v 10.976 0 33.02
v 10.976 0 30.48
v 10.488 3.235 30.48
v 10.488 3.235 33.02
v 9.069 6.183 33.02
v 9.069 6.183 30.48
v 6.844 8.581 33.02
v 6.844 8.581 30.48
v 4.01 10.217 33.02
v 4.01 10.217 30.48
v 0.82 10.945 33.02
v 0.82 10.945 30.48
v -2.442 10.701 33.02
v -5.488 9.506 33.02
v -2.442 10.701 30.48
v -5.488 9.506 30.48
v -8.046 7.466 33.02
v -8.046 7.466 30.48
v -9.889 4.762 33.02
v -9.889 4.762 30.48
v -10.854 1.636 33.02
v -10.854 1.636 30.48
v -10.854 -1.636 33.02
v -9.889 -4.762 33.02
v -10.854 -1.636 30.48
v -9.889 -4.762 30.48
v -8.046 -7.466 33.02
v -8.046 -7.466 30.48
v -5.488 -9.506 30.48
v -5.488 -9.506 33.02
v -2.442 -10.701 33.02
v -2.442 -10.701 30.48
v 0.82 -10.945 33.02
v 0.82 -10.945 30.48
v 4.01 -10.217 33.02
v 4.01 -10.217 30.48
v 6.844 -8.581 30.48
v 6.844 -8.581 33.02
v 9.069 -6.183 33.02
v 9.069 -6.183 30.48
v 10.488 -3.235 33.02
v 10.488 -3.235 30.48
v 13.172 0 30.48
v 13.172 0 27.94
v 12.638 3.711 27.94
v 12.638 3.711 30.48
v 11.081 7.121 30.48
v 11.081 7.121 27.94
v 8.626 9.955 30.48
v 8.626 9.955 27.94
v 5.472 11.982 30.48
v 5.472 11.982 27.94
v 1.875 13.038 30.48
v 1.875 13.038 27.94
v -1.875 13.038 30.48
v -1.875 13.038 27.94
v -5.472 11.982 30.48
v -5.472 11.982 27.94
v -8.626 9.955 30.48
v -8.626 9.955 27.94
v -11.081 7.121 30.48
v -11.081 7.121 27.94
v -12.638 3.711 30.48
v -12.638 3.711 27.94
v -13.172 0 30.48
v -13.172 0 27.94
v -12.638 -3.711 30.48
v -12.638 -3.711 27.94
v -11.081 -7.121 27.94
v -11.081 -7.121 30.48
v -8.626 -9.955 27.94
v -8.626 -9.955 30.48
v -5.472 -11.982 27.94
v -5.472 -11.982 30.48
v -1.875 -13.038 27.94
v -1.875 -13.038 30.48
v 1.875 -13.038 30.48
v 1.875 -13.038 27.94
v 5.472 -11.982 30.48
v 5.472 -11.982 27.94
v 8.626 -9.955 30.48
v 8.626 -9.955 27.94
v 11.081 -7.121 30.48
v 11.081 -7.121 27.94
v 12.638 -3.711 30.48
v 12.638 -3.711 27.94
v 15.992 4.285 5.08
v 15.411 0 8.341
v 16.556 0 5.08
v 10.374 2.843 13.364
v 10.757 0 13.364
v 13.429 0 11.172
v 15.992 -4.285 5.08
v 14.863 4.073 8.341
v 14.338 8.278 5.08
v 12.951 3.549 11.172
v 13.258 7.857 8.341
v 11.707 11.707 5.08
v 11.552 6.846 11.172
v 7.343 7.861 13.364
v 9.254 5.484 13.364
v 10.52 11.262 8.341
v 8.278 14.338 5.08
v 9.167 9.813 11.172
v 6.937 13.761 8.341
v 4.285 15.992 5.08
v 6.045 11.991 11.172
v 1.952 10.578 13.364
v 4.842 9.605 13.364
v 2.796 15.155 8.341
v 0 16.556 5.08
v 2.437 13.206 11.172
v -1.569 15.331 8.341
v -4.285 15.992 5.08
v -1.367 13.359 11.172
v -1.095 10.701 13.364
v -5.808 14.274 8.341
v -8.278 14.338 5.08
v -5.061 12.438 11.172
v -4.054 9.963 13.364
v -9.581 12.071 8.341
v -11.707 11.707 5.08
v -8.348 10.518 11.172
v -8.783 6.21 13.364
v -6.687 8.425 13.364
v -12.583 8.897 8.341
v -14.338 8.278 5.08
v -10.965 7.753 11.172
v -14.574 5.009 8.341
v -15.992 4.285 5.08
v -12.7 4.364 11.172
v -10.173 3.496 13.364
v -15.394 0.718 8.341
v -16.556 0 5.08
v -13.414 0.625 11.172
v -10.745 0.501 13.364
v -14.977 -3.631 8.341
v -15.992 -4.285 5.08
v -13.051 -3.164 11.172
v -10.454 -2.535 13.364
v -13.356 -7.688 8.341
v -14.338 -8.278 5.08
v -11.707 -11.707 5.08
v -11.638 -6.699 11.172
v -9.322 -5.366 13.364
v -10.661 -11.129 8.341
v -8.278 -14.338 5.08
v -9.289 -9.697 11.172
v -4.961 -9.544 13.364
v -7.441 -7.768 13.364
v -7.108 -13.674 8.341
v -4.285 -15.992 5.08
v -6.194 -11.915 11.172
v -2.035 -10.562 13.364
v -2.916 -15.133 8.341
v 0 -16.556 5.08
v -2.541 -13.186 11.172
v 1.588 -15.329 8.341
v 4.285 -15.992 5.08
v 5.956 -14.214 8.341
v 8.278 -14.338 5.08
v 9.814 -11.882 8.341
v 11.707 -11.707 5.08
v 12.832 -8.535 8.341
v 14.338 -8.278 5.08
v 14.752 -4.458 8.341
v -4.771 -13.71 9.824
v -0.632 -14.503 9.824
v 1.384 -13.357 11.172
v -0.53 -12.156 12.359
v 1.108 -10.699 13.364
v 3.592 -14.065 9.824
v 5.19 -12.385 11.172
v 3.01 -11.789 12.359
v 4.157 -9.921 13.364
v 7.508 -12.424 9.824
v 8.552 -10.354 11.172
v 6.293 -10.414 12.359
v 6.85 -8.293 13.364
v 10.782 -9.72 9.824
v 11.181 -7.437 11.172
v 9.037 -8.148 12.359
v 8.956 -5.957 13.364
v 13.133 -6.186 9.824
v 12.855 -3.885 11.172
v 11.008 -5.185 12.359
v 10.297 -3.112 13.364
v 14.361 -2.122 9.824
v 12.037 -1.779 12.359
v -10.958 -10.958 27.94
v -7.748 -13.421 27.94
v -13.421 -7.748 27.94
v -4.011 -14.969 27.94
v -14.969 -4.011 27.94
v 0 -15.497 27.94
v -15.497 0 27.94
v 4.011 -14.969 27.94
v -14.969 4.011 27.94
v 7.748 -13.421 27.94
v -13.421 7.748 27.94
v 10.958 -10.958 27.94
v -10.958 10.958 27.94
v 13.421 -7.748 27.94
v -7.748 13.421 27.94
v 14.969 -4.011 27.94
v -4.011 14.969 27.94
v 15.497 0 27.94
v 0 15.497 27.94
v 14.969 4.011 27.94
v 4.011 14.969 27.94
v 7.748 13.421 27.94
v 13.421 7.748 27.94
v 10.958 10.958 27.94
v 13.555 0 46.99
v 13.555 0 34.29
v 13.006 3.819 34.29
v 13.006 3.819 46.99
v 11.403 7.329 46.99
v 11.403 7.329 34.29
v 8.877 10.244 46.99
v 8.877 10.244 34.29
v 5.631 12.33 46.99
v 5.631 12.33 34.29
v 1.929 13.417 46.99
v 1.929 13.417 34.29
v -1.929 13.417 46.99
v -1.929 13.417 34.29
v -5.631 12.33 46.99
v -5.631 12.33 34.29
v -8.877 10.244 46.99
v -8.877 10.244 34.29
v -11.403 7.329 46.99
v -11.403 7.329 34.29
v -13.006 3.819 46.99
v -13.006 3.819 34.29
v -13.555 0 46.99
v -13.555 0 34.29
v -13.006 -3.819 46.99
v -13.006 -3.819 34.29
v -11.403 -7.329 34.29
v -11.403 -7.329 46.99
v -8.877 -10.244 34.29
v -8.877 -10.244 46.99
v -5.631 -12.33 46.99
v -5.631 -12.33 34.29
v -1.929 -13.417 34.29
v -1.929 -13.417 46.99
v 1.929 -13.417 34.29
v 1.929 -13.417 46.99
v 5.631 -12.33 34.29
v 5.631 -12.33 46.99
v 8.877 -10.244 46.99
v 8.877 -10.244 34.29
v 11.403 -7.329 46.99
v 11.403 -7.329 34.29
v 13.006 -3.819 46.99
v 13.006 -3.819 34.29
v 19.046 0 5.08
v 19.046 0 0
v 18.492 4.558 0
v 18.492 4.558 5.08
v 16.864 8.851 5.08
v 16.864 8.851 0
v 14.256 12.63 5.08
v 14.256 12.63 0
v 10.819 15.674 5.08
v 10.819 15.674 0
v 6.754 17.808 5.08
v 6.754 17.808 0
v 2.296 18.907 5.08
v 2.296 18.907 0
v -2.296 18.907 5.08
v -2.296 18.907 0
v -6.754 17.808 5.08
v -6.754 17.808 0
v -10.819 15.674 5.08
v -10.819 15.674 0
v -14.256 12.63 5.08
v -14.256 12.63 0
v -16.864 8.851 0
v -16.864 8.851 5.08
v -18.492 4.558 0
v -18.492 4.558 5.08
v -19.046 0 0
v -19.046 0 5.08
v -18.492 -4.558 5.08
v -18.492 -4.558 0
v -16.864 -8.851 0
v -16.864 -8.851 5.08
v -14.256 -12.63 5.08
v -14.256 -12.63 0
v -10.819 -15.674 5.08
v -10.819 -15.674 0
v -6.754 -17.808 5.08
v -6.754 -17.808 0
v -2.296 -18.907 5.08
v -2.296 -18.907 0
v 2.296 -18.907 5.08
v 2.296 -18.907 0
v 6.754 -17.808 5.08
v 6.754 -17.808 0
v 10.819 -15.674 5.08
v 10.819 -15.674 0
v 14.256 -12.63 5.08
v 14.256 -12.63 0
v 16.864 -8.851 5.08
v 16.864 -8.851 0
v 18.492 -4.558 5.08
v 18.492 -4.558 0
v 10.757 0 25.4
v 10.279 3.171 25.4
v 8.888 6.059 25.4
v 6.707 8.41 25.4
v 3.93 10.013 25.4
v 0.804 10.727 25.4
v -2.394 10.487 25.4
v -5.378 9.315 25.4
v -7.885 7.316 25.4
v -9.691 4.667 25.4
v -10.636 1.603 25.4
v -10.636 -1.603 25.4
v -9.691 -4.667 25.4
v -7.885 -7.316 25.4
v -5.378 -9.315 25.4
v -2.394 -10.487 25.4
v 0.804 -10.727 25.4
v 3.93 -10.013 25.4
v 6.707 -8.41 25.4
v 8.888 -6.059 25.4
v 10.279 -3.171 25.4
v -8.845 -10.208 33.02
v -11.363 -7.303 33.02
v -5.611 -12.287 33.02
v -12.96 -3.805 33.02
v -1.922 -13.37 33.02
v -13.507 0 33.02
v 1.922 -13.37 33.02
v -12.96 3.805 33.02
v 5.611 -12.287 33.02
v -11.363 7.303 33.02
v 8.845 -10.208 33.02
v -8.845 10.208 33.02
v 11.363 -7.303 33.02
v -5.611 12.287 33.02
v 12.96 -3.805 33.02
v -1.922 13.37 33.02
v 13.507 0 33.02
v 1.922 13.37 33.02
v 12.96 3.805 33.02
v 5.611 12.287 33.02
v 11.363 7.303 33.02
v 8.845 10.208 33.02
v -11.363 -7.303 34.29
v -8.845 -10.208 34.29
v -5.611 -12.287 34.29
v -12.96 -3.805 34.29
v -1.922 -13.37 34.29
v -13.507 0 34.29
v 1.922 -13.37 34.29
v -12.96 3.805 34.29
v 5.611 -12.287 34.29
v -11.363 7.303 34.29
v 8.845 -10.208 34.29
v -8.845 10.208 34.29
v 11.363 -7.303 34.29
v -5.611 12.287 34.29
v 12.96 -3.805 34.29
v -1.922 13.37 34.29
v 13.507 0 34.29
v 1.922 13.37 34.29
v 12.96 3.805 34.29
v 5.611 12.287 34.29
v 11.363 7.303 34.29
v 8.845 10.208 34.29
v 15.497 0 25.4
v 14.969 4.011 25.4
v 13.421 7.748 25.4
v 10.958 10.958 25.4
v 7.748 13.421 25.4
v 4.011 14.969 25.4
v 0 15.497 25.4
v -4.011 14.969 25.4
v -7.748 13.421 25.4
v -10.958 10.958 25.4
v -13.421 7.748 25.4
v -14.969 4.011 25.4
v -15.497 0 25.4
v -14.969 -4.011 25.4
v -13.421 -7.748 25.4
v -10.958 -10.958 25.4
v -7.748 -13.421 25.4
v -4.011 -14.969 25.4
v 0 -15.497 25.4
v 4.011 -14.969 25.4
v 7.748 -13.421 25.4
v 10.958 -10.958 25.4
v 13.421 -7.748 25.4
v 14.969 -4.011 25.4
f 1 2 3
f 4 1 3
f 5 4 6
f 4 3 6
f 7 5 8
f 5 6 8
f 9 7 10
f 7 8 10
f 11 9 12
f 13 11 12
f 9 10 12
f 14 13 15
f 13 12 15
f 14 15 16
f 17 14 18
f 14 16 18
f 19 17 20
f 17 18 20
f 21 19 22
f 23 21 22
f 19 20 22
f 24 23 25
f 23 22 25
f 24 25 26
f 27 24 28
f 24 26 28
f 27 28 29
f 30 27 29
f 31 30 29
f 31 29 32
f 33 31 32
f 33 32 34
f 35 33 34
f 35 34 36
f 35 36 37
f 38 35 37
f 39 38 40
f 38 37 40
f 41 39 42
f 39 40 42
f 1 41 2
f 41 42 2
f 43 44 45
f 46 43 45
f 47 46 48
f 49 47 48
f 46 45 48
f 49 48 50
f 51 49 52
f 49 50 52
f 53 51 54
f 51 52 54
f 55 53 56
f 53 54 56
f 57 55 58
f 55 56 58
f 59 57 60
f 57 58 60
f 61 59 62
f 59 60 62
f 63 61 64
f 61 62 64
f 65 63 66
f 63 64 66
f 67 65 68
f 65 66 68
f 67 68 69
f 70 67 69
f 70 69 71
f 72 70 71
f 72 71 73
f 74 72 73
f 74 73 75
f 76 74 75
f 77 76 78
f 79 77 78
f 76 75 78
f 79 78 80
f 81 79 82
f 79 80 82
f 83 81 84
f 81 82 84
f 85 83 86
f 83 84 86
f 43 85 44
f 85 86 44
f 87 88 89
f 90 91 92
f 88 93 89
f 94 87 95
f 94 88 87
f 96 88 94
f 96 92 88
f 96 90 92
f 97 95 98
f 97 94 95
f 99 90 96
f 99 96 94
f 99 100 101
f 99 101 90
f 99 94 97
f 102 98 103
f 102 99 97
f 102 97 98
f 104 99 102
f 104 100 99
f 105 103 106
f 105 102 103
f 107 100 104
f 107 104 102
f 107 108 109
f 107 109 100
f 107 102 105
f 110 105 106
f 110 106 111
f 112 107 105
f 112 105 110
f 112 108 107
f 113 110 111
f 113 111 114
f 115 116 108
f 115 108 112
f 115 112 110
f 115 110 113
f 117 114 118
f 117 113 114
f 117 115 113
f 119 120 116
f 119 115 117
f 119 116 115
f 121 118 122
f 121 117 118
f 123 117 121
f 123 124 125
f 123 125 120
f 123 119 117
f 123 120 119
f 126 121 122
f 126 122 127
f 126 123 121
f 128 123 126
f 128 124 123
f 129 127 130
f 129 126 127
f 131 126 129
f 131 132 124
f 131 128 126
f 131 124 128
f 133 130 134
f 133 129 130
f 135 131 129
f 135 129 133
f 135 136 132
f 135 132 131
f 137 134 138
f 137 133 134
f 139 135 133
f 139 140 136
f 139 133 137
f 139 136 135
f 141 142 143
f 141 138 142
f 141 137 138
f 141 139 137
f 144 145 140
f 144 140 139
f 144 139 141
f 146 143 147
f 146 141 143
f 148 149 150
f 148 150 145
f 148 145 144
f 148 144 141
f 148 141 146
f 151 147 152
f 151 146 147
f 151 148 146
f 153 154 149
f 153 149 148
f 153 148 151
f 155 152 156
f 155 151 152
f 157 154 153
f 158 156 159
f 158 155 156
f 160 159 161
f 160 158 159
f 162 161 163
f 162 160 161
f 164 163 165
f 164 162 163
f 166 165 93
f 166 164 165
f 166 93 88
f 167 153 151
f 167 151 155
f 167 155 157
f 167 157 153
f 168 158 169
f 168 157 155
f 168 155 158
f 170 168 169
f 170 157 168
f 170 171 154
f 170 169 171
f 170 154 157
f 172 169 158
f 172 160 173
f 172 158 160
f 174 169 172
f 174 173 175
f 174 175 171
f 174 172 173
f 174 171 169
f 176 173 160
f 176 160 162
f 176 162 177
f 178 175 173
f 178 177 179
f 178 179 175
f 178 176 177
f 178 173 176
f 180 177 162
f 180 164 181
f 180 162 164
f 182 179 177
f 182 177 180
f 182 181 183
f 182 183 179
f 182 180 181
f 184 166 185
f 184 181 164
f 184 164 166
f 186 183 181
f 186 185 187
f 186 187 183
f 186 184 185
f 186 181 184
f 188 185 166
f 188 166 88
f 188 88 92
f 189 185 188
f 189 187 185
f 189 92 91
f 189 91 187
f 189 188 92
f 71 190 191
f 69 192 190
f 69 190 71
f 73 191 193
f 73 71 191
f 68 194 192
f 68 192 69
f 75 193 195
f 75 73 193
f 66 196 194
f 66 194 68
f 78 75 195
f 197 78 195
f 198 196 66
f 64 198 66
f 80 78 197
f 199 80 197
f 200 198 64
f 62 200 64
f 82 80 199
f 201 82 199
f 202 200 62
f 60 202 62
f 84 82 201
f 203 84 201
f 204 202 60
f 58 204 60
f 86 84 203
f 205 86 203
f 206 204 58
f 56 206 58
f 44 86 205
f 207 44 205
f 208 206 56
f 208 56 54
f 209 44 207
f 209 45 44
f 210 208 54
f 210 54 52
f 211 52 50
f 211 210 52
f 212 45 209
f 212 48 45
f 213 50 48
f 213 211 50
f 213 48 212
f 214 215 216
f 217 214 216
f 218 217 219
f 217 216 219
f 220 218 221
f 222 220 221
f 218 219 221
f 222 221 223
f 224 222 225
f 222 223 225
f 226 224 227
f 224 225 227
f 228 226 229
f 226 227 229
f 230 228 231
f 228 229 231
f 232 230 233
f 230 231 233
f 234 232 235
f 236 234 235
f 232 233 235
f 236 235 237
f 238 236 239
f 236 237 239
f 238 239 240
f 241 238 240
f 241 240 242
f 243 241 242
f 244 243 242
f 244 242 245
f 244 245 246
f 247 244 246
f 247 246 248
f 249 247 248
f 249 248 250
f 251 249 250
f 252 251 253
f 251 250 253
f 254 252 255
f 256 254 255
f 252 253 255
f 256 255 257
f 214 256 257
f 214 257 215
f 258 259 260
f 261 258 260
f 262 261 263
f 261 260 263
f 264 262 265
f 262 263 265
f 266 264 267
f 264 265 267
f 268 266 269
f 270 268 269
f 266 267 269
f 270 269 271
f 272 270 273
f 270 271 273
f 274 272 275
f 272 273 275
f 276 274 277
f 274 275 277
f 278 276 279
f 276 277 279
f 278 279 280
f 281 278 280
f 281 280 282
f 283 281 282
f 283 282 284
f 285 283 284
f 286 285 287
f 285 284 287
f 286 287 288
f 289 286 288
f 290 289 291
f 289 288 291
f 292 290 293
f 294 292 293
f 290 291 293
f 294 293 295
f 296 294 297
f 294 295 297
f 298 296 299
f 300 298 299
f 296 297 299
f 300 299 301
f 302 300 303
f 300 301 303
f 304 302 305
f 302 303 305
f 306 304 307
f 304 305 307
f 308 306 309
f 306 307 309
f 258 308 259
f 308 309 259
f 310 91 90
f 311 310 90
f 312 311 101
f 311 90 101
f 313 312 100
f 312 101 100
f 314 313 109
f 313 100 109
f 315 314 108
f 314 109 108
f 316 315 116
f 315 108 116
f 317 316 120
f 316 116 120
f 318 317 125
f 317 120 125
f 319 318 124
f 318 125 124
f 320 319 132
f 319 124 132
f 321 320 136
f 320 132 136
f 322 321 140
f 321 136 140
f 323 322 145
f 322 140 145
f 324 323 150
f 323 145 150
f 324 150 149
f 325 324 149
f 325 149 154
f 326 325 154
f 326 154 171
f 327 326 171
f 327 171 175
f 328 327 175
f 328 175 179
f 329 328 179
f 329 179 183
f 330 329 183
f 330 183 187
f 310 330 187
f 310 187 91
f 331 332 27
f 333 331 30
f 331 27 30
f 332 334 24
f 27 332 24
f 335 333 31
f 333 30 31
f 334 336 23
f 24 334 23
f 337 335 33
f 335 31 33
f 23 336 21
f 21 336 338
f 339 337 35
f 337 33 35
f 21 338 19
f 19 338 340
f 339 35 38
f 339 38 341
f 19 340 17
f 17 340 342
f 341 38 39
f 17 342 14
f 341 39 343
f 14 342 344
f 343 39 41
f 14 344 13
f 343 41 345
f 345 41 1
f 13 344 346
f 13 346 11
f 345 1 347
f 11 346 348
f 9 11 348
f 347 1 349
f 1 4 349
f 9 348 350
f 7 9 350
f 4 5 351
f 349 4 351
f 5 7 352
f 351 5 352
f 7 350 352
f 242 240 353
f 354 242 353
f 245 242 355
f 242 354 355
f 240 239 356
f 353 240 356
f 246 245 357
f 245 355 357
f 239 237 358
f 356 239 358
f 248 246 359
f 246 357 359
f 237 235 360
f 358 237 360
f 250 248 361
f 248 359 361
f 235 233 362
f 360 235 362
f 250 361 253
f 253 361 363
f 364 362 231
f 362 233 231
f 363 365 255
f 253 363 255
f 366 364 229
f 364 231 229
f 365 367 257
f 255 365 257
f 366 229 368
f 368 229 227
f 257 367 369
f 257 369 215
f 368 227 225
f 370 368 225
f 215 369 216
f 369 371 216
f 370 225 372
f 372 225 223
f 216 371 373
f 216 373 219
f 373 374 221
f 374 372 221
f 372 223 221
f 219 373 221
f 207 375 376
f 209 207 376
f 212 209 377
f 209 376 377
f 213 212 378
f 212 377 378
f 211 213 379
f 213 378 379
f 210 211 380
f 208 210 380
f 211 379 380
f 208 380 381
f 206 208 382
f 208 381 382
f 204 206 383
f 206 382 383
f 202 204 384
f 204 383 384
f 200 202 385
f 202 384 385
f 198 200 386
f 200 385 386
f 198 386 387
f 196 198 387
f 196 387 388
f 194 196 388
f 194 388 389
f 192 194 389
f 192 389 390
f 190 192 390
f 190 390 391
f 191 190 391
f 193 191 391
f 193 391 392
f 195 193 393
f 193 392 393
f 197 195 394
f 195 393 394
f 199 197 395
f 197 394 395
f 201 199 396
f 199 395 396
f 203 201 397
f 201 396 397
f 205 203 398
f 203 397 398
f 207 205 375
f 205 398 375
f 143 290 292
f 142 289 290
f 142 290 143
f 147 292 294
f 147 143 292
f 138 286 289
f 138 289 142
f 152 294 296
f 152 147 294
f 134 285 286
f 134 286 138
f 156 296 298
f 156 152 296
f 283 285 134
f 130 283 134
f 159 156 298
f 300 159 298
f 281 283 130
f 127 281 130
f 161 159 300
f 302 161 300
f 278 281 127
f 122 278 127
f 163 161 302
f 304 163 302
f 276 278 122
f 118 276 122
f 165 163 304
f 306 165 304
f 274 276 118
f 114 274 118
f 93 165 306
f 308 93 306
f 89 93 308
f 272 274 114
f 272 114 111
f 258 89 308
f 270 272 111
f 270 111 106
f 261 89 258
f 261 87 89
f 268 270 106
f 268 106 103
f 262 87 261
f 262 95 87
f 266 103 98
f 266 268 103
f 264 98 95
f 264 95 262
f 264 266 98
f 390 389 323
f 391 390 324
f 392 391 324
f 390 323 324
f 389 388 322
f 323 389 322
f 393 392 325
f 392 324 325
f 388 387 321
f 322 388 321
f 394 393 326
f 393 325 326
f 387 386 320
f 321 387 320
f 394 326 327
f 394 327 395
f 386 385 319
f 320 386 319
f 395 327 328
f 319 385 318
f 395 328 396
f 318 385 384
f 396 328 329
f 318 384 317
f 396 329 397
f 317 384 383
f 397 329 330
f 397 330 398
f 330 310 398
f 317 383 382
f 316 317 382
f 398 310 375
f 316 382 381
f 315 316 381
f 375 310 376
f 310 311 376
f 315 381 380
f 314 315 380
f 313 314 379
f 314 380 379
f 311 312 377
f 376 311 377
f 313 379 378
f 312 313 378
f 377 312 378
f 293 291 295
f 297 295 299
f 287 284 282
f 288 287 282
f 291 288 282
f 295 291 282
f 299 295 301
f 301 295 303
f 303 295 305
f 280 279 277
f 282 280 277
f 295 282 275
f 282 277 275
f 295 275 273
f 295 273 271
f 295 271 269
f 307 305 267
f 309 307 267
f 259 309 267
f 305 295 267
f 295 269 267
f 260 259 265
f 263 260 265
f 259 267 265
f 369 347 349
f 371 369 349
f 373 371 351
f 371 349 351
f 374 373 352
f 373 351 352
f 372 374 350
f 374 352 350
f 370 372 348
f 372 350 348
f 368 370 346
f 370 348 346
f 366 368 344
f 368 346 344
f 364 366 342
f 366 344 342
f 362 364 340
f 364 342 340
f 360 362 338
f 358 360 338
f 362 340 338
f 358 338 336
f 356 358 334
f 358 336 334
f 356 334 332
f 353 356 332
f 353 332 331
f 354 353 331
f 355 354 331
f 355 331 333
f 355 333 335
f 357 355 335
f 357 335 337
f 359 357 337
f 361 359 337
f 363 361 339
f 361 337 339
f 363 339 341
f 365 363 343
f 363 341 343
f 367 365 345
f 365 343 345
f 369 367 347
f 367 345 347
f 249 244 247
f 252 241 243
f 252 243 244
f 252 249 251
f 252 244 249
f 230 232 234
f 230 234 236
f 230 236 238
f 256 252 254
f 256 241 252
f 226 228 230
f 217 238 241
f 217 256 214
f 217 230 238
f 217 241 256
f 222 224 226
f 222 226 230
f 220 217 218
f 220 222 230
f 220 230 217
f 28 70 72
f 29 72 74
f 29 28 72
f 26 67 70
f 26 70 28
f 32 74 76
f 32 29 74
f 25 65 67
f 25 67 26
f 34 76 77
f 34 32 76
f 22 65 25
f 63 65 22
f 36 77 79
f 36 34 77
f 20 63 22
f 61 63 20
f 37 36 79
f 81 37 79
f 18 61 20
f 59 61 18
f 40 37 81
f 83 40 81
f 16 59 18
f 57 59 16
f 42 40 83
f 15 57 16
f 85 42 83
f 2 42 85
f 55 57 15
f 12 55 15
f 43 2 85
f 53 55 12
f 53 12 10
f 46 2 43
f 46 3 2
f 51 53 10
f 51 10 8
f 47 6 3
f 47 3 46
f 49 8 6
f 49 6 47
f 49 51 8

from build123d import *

# Parameters (mm, degrees)
F0_R      = 19.0458801966
F2_DEPTH  = 5.08
F1_R      = 16.5564413769
F3_DEPTH  = 15.24
F5_R      = 10.7565912882
F6_DEPTH  = 25.4
F7_R      = 15.4966869389
F8_DEPTH  = 2.54
F9_R      = 13.1720463189
F10_DEPTH = 2.54
F11_R     = 10.9761291002
F12_DEPTH = 2.54
F13_R     = 13.5071591259
F14_DEPTH = 1.27
F15_R     = 13.5553537987
F16_DEPTH = 12.7


# Not quite as in the source:
# - a fillet or chamfer that OpenCascade refuses, or shapes differently, is made with other operations: its cross-section is extruded or revolved along the edge and cut away or added


with BuildPart() as f2:
    # F0 (on Top) → F2 (new body)
    with BuildSketch(Plane.XY):
        Circle(F0_R)
    extrude(amount=F2_DEPTH)

    # F1 (on Top) → F3 (join)
    with BuildSketch(Plane.XY):
        Circle(F1_R)
    extrude(amount=F3_DEPTH)

    # F4: fillet of radius 12.7 on 1 edges, made by hand

    # F4_s1 → F4_t2 (revolve, cut)
    with BuildSketch(Plane.XZ):
        with BuildLine():
            ThreePointArc((16.5564413769, 5.08), (12.1452187403, 12.3773776994), (4.1130334835, 15.24))
            Line((4.1130334835, 15.24), (16.5564413769, 15.24))
            Line((16.5564413769, 15.24), (16.5564413769, 5.08))
        make_face()
    revolve(axis=Axis((0, 0, 15.24), (0, 0, 1)), mode=Mode.SUBTRACT)

    # F5 (on Top) → F6 (join)
    with BuildSketch(Plane.XY):
        Circle(F5_R)
    extrude(amount=F6_DEPTH)

    # F7 (on face) → F8 (join)
    with BuildSketch(Plane.XY.offset(25.4)):
        Circle(F7_R)
    extrude(amount=F8_DEPTH)

    # F9 (on face) → F10 (join)
    with BuildSketch(Plane.XY.offset(27.94)):
        Circle(F9_R)
    extrude(amount=F10_DEPTH)

    # F11 (on face) → F12 (join)
    with BuildSketch(Plane.XY.offset(30.48)):
        Circle(F11_R)
    extrude(amount=F12_DEPTH)

    # F13 (on face) → F14 (join)
    with BuildSketch(Plane.XY.offset(33.02)):
        Circle(F13_R)
    extrude(amount=F14_DEPTH)

    # F15 (on face) → F16 (join)
    with BuildSketch(Plane.XY.offset(34.29)):
        Circle(F15_R)
    extrude(amount=F16_DEPTH)


solid = f2.part
